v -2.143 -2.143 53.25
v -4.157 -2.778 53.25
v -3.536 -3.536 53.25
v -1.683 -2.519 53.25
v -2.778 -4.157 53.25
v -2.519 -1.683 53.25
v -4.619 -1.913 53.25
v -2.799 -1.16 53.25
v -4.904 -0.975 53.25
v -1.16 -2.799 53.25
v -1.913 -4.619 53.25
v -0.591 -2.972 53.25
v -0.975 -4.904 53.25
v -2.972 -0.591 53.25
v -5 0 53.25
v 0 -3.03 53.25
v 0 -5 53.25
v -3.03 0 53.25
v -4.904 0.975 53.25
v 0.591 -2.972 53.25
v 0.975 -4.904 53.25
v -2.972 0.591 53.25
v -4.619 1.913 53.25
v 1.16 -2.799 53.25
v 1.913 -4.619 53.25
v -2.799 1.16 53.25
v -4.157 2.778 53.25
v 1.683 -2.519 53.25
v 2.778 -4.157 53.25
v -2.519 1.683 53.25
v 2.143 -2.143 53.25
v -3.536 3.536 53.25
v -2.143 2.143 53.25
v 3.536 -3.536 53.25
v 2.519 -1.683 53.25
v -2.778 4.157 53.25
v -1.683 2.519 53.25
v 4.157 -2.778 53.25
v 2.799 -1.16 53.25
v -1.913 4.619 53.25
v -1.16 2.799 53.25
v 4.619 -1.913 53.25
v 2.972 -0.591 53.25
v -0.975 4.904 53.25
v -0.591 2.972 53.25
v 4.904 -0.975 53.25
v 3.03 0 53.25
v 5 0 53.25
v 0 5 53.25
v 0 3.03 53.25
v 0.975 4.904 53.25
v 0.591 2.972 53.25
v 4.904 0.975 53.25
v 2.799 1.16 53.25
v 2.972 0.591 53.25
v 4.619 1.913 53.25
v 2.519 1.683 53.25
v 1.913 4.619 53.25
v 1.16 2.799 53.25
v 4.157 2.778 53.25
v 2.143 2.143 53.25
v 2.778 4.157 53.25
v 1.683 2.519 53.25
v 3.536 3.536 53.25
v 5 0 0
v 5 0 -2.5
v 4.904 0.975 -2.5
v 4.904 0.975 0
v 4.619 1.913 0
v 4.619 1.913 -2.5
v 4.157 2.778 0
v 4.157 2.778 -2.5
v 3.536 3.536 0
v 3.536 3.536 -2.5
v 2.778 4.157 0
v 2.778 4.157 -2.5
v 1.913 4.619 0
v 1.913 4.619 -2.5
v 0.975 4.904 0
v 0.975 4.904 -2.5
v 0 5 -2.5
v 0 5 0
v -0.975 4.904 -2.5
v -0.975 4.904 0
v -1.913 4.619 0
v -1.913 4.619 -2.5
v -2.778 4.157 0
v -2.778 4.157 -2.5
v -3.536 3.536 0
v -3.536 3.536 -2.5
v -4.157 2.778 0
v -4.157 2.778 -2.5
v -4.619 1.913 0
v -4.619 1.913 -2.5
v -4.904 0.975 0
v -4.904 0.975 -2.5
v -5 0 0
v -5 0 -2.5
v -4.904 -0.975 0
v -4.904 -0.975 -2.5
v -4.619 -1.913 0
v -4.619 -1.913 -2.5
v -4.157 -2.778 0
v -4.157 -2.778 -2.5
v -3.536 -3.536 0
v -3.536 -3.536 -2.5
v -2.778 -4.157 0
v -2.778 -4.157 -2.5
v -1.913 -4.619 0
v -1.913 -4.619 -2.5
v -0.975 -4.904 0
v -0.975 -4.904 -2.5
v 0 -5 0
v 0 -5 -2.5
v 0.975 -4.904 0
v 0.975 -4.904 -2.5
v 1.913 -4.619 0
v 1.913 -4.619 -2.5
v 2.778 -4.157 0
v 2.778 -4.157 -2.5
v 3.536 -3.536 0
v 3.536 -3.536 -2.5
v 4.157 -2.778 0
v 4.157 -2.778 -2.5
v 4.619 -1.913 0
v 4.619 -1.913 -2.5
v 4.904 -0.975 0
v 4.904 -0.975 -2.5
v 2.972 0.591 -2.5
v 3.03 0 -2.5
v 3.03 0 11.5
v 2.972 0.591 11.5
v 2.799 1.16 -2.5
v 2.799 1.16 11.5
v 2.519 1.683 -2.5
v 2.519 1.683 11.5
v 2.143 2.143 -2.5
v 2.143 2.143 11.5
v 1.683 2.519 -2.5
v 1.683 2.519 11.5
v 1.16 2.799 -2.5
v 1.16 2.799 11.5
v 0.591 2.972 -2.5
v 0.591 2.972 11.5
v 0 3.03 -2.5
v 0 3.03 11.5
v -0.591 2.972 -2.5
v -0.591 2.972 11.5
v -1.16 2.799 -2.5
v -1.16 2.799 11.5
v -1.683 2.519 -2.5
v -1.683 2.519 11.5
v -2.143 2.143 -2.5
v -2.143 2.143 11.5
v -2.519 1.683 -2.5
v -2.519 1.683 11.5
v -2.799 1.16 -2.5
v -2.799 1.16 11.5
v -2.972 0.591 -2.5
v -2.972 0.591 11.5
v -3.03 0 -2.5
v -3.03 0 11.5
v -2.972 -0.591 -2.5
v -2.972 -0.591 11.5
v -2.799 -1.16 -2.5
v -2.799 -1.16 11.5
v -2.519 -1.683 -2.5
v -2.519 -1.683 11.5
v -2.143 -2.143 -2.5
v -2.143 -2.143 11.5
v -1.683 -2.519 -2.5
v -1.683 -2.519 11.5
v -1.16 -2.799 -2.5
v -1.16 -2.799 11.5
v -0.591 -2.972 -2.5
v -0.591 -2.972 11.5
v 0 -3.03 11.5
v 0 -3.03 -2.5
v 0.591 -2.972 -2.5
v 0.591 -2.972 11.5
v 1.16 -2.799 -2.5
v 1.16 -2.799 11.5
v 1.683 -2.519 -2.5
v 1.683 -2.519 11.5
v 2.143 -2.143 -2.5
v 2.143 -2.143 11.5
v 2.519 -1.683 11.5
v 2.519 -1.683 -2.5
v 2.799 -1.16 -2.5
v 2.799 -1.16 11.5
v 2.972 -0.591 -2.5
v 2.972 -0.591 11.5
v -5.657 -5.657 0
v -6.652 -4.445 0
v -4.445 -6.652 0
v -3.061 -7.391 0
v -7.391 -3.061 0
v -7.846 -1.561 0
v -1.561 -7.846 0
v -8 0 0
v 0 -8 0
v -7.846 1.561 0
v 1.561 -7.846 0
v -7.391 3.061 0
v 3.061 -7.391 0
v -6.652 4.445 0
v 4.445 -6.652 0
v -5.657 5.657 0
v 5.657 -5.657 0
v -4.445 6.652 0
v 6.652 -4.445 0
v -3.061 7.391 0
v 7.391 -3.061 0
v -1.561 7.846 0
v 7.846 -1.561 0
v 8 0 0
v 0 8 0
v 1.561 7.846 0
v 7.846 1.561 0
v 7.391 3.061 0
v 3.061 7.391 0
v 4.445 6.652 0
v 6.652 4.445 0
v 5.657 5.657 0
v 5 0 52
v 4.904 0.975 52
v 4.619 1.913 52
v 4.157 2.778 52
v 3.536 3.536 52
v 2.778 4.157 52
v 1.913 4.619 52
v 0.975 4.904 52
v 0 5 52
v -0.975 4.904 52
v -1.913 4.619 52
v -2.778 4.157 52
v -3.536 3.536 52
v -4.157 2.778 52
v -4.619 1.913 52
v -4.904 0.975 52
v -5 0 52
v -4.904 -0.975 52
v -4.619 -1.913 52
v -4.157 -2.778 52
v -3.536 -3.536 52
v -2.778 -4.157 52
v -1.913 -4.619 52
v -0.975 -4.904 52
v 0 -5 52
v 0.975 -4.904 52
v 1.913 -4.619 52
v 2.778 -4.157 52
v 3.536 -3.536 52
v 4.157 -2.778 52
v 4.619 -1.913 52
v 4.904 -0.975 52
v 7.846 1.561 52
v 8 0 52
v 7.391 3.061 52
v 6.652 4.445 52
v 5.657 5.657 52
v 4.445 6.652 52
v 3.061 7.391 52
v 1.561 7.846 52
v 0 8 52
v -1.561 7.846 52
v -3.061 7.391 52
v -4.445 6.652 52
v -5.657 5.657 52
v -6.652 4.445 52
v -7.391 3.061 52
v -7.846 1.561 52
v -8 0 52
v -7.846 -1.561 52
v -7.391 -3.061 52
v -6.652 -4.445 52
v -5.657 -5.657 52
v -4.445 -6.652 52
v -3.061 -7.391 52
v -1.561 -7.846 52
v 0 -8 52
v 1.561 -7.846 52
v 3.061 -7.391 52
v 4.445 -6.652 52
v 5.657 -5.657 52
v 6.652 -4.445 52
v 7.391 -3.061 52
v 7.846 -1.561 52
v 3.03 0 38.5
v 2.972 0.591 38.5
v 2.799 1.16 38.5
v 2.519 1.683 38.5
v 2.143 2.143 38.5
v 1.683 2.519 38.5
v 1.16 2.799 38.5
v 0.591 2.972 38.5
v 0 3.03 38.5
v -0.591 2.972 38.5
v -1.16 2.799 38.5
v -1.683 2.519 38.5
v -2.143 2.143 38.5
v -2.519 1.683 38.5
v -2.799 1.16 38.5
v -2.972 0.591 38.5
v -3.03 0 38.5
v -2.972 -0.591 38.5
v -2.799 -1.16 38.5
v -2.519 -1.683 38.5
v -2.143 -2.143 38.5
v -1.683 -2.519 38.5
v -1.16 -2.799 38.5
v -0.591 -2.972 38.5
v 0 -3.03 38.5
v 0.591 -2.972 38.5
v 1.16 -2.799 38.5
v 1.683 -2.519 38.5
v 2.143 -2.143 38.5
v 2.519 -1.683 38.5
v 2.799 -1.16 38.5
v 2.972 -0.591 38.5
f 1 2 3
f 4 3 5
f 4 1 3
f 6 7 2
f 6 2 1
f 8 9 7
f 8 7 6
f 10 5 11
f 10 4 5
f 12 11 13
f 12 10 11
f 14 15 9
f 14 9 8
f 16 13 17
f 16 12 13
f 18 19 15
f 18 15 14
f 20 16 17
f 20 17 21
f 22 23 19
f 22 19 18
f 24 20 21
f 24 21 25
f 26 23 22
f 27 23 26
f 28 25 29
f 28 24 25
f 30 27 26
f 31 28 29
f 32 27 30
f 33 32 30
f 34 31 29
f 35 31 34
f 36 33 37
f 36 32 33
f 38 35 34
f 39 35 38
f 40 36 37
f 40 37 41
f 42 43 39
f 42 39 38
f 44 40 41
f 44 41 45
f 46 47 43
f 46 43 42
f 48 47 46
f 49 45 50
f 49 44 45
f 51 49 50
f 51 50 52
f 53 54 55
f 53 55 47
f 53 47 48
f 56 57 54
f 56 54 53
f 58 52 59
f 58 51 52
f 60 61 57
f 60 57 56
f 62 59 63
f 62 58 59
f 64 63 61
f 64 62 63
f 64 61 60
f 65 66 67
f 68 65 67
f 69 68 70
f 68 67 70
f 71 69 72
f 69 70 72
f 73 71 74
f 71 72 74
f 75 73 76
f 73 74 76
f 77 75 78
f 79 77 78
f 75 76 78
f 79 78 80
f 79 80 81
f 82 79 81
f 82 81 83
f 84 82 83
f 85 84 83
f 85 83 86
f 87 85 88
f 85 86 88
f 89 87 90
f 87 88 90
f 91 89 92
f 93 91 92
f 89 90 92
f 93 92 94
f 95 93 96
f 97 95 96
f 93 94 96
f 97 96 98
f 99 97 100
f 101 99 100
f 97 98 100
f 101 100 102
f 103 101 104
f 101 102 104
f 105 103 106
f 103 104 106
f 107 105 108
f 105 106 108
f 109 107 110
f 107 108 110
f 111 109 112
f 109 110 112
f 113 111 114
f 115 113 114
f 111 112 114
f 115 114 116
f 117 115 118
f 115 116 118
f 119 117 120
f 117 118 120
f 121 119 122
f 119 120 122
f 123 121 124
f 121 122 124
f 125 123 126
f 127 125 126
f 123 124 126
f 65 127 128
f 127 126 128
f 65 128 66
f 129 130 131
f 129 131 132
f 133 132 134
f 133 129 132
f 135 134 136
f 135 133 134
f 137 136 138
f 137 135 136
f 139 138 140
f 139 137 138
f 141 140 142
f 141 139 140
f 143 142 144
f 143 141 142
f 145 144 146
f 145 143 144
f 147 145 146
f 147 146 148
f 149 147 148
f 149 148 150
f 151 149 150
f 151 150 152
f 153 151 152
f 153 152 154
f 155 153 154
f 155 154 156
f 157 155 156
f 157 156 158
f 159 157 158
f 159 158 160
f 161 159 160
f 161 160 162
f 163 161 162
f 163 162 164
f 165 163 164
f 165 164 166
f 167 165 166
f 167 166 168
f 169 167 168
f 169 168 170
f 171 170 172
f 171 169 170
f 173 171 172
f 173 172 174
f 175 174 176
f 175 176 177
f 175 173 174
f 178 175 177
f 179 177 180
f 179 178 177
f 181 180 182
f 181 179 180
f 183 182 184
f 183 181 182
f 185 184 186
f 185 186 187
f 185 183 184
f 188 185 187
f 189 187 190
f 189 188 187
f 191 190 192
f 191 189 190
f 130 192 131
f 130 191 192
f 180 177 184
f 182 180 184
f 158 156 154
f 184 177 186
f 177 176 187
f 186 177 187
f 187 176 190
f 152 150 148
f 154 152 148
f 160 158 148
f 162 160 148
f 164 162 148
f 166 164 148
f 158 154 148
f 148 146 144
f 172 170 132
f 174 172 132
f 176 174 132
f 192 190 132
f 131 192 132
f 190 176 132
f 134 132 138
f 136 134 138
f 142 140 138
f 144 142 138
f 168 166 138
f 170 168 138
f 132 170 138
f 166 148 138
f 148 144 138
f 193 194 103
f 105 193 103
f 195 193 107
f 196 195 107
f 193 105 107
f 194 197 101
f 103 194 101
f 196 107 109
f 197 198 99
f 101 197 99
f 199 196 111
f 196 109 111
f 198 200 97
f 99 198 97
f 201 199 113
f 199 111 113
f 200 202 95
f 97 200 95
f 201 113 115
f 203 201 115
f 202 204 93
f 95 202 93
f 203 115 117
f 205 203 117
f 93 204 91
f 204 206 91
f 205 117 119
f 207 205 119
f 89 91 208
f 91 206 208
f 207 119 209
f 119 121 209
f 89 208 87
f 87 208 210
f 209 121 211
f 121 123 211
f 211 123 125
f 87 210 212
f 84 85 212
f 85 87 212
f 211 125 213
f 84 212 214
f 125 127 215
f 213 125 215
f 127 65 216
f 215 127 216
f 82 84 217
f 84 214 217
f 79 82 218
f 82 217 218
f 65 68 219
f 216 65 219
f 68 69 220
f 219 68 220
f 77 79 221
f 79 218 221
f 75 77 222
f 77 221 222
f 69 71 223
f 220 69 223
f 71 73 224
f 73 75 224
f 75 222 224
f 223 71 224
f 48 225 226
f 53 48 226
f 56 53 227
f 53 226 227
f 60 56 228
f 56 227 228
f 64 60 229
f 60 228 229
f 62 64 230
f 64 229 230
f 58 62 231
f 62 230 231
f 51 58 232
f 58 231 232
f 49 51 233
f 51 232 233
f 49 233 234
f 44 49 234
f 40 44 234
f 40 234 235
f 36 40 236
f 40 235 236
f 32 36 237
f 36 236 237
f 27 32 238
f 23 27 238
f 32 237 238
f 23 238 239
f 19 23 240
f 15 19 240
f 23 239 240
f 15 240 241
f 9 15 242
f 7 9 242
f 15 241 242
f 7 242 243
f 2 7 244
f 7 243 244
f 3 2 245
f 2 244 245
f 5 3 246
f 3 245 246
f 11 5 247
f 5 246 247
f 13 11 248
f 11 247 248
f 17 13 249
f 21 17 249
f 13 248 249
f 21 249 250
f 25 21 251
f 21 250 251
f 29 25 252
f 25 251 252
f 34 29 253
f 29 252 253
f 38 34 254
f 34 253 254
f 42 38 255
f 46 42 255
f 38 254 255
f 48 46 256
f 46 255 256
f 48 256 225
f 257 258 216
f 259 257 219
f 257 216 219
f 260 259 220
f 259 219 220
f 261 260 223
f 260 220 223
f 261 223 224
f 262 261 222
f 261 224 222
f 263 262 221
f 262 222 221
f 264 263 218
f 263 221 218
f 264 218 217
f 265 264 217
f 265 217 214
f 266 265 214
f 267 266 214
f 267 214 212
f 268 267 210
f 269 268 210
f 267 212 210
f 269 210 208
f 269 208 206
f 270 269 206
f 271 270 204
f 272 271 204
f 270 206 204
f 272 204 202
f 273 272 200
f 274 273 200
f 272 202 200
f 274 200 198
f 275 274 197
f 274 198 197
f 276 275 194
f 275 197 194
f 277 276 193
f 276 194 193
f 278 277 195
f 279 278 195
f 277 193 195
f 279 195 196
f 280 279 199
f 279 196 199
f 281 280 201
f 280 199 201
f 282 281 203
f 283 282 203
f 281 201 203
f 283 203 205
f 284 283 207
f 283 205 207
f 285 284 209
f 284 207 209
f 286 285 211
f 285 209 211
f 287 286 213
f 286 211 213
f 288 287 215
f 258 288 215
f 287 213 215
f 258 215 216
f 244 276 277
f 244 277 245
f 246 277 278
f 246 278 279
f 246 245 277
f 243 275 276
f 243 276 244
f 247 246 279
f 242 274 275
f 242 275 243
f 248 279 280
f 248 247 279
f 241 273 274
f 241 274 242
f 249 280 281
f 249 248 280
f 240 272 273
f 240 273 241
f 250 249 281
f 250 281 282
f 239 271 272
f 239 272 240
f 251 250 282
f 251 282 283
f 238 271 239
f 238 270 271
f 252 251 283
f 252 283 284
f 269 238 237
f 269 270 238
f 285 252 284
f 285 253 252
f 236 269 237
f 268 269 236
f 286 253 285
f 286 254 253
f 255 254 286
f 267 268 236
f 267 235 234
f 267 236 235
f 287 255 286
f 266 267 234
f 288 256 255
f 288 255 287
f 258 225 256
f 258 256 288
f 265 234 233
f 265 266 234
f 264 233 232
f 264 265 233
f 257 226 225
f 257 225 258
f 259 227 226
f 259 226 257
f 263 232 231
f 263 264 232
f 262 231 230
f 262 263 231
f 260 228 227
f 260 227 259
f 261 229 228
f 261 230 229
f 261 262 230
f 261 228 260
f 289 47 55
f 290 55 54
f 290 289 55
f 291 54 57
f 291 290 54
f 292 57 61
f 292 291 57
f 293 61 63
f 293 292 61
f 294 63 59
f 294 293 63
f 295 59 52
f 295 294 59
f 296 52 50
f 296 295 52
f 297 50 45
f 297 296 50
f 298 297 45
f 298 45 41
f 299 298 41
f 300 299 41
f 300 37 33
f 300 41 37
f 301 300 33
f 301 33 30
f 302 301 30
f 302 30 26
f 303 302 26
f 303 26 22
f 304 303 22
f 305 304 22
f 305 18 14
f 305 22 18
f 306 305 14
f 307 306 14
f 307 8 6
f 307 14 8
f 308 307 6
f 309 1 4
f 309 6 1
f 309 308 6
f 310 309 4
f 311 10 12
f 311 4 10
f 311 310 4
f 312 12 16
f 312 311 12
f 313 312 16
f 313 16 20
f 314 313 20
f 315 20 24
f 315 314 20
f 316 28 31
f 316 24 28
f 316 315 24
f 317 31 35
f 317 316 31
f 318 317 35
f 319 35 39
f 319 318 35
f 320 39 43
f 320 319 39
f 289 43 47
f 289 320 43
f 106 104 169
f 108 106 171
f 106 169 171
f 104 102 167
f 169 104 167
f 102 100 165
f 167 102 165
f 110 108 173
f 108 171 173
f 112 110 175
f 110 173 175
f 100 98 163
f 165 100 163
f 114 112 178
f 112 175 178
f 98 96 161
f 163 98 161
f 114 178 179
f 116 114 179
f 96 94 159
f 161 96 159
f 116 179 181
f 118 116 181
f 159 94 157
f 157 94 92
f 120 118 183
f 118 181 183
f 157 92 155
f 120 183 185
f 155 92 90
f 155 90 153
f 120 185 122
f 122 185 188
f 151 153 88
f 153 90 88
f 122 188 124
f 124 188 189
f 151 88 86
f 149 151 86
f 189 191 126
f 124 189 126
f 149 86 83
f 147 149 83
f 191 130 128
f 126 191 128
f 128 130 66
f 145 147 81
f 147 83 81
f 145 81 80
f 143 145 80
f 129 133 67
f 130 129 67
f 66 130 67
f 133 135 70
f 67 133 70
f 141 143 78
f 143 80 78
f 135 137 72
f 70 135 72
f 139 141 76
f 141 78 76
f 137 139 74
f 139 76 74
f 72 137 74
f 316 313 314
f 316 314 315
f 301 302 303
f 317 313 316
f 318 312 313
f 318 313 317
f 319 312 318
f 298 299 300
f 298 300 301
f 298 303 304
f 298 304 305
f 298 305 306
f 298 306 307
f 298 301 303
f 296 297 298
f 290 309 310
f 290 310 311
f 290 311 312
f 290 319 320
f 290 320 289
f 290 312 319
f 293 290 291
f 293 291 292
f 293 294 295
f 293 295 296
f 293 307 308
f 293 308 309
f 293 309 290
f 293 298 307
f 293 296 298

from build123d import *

# Parameters (mm, degrees)
S01_TURNED_STEEL_BODY_R               = 8
F_01_TURNED_STEEL_BODY_DEPTH          = 52
F_02_START                            = -2.5
S02_BACKPLATE_LOCATING_SPIGOT_R       = 5
F_02_BACKPLATE_LOCATING_SPIGOT_DEPTH  = 2.5
F_03_START                            = 52
S03_TRACK_LOCATING_SPIGOT_R           = 5
F_03_TRACK_LOCATING_SPIGOT_DEPTH      = 1.25
F_04_START                            = -2.6
S04_REAR_M6_THREADED_ENVELOPE_R       = 3.03
F_04_REAR_M6_THREADED_ENVELOPE_DEPTH  = 14.1
F_05_START                            = 38.5
S05_FRONT_M6_THREADED_ENVELOPE_R      = 3.03
F_05_FRONT_M6_THREADED_ENVELOPE_DEPTH = 15


with BuildPart() as part:
    # S01 - Turned steel body → 01 - Turned steel body (new body)
    with BuildSketch(Plane.XY):
        Circle(S01_TURNED_STEEL_BODY_R)
    extrude(amount=F_01_TURNED_STEEL_BODY_DEPTH)

    # S02 - Backplate locating spigot → 02 - Backplate locating spigot (add)
    with BuildSketch(Plane.XY.offset(F_02_START)):
        Circle(S02_BACKPLATE_LOCATING_SPIGOT_R)
    extrude(amount=F_02_BACKPLATE_LOCATING_SPIGOT_DEPTH)

    # S03 - Track locating spigot → 03 - Track locating spigot (add)
    with BuildSketch(Plane.XY.offset(F_03_START)):
        Circle(S03_TRACK_LOCATING_SPIGOT_R)
    extrude(amount=F_03_TRACK_LOCATING_SPIGOT_DEPTH)

    # S04 - Rear M6 threaded envelope → 04 - Rear M6 threaded envelope (cut)
    with BuildSketch(Plane.XY.offset(F_04_START)):
        Circle(S04_REAR_M6_THREADED_ENVELOPE_R)
    extrude(amount=F_04_REAR_M6_THREADED_ENVELOPE_DEPTH, mode=Mode.SUBTRACT)

    # S05 - Front M6 threaded envelope → 05 - Front M6 threaded envelope (cut)
    with BuildSketch(Plane.XY.offset(F_05_START)):
        Circle(S05_FRONT_M6_THREADED_ENVELOPE_R)
    extrude(amount=F_05_FRONT_M6_THREADED_ENVELOPE_DEPTH, mode=Mode.SUBTRACT)


solid = part.part
